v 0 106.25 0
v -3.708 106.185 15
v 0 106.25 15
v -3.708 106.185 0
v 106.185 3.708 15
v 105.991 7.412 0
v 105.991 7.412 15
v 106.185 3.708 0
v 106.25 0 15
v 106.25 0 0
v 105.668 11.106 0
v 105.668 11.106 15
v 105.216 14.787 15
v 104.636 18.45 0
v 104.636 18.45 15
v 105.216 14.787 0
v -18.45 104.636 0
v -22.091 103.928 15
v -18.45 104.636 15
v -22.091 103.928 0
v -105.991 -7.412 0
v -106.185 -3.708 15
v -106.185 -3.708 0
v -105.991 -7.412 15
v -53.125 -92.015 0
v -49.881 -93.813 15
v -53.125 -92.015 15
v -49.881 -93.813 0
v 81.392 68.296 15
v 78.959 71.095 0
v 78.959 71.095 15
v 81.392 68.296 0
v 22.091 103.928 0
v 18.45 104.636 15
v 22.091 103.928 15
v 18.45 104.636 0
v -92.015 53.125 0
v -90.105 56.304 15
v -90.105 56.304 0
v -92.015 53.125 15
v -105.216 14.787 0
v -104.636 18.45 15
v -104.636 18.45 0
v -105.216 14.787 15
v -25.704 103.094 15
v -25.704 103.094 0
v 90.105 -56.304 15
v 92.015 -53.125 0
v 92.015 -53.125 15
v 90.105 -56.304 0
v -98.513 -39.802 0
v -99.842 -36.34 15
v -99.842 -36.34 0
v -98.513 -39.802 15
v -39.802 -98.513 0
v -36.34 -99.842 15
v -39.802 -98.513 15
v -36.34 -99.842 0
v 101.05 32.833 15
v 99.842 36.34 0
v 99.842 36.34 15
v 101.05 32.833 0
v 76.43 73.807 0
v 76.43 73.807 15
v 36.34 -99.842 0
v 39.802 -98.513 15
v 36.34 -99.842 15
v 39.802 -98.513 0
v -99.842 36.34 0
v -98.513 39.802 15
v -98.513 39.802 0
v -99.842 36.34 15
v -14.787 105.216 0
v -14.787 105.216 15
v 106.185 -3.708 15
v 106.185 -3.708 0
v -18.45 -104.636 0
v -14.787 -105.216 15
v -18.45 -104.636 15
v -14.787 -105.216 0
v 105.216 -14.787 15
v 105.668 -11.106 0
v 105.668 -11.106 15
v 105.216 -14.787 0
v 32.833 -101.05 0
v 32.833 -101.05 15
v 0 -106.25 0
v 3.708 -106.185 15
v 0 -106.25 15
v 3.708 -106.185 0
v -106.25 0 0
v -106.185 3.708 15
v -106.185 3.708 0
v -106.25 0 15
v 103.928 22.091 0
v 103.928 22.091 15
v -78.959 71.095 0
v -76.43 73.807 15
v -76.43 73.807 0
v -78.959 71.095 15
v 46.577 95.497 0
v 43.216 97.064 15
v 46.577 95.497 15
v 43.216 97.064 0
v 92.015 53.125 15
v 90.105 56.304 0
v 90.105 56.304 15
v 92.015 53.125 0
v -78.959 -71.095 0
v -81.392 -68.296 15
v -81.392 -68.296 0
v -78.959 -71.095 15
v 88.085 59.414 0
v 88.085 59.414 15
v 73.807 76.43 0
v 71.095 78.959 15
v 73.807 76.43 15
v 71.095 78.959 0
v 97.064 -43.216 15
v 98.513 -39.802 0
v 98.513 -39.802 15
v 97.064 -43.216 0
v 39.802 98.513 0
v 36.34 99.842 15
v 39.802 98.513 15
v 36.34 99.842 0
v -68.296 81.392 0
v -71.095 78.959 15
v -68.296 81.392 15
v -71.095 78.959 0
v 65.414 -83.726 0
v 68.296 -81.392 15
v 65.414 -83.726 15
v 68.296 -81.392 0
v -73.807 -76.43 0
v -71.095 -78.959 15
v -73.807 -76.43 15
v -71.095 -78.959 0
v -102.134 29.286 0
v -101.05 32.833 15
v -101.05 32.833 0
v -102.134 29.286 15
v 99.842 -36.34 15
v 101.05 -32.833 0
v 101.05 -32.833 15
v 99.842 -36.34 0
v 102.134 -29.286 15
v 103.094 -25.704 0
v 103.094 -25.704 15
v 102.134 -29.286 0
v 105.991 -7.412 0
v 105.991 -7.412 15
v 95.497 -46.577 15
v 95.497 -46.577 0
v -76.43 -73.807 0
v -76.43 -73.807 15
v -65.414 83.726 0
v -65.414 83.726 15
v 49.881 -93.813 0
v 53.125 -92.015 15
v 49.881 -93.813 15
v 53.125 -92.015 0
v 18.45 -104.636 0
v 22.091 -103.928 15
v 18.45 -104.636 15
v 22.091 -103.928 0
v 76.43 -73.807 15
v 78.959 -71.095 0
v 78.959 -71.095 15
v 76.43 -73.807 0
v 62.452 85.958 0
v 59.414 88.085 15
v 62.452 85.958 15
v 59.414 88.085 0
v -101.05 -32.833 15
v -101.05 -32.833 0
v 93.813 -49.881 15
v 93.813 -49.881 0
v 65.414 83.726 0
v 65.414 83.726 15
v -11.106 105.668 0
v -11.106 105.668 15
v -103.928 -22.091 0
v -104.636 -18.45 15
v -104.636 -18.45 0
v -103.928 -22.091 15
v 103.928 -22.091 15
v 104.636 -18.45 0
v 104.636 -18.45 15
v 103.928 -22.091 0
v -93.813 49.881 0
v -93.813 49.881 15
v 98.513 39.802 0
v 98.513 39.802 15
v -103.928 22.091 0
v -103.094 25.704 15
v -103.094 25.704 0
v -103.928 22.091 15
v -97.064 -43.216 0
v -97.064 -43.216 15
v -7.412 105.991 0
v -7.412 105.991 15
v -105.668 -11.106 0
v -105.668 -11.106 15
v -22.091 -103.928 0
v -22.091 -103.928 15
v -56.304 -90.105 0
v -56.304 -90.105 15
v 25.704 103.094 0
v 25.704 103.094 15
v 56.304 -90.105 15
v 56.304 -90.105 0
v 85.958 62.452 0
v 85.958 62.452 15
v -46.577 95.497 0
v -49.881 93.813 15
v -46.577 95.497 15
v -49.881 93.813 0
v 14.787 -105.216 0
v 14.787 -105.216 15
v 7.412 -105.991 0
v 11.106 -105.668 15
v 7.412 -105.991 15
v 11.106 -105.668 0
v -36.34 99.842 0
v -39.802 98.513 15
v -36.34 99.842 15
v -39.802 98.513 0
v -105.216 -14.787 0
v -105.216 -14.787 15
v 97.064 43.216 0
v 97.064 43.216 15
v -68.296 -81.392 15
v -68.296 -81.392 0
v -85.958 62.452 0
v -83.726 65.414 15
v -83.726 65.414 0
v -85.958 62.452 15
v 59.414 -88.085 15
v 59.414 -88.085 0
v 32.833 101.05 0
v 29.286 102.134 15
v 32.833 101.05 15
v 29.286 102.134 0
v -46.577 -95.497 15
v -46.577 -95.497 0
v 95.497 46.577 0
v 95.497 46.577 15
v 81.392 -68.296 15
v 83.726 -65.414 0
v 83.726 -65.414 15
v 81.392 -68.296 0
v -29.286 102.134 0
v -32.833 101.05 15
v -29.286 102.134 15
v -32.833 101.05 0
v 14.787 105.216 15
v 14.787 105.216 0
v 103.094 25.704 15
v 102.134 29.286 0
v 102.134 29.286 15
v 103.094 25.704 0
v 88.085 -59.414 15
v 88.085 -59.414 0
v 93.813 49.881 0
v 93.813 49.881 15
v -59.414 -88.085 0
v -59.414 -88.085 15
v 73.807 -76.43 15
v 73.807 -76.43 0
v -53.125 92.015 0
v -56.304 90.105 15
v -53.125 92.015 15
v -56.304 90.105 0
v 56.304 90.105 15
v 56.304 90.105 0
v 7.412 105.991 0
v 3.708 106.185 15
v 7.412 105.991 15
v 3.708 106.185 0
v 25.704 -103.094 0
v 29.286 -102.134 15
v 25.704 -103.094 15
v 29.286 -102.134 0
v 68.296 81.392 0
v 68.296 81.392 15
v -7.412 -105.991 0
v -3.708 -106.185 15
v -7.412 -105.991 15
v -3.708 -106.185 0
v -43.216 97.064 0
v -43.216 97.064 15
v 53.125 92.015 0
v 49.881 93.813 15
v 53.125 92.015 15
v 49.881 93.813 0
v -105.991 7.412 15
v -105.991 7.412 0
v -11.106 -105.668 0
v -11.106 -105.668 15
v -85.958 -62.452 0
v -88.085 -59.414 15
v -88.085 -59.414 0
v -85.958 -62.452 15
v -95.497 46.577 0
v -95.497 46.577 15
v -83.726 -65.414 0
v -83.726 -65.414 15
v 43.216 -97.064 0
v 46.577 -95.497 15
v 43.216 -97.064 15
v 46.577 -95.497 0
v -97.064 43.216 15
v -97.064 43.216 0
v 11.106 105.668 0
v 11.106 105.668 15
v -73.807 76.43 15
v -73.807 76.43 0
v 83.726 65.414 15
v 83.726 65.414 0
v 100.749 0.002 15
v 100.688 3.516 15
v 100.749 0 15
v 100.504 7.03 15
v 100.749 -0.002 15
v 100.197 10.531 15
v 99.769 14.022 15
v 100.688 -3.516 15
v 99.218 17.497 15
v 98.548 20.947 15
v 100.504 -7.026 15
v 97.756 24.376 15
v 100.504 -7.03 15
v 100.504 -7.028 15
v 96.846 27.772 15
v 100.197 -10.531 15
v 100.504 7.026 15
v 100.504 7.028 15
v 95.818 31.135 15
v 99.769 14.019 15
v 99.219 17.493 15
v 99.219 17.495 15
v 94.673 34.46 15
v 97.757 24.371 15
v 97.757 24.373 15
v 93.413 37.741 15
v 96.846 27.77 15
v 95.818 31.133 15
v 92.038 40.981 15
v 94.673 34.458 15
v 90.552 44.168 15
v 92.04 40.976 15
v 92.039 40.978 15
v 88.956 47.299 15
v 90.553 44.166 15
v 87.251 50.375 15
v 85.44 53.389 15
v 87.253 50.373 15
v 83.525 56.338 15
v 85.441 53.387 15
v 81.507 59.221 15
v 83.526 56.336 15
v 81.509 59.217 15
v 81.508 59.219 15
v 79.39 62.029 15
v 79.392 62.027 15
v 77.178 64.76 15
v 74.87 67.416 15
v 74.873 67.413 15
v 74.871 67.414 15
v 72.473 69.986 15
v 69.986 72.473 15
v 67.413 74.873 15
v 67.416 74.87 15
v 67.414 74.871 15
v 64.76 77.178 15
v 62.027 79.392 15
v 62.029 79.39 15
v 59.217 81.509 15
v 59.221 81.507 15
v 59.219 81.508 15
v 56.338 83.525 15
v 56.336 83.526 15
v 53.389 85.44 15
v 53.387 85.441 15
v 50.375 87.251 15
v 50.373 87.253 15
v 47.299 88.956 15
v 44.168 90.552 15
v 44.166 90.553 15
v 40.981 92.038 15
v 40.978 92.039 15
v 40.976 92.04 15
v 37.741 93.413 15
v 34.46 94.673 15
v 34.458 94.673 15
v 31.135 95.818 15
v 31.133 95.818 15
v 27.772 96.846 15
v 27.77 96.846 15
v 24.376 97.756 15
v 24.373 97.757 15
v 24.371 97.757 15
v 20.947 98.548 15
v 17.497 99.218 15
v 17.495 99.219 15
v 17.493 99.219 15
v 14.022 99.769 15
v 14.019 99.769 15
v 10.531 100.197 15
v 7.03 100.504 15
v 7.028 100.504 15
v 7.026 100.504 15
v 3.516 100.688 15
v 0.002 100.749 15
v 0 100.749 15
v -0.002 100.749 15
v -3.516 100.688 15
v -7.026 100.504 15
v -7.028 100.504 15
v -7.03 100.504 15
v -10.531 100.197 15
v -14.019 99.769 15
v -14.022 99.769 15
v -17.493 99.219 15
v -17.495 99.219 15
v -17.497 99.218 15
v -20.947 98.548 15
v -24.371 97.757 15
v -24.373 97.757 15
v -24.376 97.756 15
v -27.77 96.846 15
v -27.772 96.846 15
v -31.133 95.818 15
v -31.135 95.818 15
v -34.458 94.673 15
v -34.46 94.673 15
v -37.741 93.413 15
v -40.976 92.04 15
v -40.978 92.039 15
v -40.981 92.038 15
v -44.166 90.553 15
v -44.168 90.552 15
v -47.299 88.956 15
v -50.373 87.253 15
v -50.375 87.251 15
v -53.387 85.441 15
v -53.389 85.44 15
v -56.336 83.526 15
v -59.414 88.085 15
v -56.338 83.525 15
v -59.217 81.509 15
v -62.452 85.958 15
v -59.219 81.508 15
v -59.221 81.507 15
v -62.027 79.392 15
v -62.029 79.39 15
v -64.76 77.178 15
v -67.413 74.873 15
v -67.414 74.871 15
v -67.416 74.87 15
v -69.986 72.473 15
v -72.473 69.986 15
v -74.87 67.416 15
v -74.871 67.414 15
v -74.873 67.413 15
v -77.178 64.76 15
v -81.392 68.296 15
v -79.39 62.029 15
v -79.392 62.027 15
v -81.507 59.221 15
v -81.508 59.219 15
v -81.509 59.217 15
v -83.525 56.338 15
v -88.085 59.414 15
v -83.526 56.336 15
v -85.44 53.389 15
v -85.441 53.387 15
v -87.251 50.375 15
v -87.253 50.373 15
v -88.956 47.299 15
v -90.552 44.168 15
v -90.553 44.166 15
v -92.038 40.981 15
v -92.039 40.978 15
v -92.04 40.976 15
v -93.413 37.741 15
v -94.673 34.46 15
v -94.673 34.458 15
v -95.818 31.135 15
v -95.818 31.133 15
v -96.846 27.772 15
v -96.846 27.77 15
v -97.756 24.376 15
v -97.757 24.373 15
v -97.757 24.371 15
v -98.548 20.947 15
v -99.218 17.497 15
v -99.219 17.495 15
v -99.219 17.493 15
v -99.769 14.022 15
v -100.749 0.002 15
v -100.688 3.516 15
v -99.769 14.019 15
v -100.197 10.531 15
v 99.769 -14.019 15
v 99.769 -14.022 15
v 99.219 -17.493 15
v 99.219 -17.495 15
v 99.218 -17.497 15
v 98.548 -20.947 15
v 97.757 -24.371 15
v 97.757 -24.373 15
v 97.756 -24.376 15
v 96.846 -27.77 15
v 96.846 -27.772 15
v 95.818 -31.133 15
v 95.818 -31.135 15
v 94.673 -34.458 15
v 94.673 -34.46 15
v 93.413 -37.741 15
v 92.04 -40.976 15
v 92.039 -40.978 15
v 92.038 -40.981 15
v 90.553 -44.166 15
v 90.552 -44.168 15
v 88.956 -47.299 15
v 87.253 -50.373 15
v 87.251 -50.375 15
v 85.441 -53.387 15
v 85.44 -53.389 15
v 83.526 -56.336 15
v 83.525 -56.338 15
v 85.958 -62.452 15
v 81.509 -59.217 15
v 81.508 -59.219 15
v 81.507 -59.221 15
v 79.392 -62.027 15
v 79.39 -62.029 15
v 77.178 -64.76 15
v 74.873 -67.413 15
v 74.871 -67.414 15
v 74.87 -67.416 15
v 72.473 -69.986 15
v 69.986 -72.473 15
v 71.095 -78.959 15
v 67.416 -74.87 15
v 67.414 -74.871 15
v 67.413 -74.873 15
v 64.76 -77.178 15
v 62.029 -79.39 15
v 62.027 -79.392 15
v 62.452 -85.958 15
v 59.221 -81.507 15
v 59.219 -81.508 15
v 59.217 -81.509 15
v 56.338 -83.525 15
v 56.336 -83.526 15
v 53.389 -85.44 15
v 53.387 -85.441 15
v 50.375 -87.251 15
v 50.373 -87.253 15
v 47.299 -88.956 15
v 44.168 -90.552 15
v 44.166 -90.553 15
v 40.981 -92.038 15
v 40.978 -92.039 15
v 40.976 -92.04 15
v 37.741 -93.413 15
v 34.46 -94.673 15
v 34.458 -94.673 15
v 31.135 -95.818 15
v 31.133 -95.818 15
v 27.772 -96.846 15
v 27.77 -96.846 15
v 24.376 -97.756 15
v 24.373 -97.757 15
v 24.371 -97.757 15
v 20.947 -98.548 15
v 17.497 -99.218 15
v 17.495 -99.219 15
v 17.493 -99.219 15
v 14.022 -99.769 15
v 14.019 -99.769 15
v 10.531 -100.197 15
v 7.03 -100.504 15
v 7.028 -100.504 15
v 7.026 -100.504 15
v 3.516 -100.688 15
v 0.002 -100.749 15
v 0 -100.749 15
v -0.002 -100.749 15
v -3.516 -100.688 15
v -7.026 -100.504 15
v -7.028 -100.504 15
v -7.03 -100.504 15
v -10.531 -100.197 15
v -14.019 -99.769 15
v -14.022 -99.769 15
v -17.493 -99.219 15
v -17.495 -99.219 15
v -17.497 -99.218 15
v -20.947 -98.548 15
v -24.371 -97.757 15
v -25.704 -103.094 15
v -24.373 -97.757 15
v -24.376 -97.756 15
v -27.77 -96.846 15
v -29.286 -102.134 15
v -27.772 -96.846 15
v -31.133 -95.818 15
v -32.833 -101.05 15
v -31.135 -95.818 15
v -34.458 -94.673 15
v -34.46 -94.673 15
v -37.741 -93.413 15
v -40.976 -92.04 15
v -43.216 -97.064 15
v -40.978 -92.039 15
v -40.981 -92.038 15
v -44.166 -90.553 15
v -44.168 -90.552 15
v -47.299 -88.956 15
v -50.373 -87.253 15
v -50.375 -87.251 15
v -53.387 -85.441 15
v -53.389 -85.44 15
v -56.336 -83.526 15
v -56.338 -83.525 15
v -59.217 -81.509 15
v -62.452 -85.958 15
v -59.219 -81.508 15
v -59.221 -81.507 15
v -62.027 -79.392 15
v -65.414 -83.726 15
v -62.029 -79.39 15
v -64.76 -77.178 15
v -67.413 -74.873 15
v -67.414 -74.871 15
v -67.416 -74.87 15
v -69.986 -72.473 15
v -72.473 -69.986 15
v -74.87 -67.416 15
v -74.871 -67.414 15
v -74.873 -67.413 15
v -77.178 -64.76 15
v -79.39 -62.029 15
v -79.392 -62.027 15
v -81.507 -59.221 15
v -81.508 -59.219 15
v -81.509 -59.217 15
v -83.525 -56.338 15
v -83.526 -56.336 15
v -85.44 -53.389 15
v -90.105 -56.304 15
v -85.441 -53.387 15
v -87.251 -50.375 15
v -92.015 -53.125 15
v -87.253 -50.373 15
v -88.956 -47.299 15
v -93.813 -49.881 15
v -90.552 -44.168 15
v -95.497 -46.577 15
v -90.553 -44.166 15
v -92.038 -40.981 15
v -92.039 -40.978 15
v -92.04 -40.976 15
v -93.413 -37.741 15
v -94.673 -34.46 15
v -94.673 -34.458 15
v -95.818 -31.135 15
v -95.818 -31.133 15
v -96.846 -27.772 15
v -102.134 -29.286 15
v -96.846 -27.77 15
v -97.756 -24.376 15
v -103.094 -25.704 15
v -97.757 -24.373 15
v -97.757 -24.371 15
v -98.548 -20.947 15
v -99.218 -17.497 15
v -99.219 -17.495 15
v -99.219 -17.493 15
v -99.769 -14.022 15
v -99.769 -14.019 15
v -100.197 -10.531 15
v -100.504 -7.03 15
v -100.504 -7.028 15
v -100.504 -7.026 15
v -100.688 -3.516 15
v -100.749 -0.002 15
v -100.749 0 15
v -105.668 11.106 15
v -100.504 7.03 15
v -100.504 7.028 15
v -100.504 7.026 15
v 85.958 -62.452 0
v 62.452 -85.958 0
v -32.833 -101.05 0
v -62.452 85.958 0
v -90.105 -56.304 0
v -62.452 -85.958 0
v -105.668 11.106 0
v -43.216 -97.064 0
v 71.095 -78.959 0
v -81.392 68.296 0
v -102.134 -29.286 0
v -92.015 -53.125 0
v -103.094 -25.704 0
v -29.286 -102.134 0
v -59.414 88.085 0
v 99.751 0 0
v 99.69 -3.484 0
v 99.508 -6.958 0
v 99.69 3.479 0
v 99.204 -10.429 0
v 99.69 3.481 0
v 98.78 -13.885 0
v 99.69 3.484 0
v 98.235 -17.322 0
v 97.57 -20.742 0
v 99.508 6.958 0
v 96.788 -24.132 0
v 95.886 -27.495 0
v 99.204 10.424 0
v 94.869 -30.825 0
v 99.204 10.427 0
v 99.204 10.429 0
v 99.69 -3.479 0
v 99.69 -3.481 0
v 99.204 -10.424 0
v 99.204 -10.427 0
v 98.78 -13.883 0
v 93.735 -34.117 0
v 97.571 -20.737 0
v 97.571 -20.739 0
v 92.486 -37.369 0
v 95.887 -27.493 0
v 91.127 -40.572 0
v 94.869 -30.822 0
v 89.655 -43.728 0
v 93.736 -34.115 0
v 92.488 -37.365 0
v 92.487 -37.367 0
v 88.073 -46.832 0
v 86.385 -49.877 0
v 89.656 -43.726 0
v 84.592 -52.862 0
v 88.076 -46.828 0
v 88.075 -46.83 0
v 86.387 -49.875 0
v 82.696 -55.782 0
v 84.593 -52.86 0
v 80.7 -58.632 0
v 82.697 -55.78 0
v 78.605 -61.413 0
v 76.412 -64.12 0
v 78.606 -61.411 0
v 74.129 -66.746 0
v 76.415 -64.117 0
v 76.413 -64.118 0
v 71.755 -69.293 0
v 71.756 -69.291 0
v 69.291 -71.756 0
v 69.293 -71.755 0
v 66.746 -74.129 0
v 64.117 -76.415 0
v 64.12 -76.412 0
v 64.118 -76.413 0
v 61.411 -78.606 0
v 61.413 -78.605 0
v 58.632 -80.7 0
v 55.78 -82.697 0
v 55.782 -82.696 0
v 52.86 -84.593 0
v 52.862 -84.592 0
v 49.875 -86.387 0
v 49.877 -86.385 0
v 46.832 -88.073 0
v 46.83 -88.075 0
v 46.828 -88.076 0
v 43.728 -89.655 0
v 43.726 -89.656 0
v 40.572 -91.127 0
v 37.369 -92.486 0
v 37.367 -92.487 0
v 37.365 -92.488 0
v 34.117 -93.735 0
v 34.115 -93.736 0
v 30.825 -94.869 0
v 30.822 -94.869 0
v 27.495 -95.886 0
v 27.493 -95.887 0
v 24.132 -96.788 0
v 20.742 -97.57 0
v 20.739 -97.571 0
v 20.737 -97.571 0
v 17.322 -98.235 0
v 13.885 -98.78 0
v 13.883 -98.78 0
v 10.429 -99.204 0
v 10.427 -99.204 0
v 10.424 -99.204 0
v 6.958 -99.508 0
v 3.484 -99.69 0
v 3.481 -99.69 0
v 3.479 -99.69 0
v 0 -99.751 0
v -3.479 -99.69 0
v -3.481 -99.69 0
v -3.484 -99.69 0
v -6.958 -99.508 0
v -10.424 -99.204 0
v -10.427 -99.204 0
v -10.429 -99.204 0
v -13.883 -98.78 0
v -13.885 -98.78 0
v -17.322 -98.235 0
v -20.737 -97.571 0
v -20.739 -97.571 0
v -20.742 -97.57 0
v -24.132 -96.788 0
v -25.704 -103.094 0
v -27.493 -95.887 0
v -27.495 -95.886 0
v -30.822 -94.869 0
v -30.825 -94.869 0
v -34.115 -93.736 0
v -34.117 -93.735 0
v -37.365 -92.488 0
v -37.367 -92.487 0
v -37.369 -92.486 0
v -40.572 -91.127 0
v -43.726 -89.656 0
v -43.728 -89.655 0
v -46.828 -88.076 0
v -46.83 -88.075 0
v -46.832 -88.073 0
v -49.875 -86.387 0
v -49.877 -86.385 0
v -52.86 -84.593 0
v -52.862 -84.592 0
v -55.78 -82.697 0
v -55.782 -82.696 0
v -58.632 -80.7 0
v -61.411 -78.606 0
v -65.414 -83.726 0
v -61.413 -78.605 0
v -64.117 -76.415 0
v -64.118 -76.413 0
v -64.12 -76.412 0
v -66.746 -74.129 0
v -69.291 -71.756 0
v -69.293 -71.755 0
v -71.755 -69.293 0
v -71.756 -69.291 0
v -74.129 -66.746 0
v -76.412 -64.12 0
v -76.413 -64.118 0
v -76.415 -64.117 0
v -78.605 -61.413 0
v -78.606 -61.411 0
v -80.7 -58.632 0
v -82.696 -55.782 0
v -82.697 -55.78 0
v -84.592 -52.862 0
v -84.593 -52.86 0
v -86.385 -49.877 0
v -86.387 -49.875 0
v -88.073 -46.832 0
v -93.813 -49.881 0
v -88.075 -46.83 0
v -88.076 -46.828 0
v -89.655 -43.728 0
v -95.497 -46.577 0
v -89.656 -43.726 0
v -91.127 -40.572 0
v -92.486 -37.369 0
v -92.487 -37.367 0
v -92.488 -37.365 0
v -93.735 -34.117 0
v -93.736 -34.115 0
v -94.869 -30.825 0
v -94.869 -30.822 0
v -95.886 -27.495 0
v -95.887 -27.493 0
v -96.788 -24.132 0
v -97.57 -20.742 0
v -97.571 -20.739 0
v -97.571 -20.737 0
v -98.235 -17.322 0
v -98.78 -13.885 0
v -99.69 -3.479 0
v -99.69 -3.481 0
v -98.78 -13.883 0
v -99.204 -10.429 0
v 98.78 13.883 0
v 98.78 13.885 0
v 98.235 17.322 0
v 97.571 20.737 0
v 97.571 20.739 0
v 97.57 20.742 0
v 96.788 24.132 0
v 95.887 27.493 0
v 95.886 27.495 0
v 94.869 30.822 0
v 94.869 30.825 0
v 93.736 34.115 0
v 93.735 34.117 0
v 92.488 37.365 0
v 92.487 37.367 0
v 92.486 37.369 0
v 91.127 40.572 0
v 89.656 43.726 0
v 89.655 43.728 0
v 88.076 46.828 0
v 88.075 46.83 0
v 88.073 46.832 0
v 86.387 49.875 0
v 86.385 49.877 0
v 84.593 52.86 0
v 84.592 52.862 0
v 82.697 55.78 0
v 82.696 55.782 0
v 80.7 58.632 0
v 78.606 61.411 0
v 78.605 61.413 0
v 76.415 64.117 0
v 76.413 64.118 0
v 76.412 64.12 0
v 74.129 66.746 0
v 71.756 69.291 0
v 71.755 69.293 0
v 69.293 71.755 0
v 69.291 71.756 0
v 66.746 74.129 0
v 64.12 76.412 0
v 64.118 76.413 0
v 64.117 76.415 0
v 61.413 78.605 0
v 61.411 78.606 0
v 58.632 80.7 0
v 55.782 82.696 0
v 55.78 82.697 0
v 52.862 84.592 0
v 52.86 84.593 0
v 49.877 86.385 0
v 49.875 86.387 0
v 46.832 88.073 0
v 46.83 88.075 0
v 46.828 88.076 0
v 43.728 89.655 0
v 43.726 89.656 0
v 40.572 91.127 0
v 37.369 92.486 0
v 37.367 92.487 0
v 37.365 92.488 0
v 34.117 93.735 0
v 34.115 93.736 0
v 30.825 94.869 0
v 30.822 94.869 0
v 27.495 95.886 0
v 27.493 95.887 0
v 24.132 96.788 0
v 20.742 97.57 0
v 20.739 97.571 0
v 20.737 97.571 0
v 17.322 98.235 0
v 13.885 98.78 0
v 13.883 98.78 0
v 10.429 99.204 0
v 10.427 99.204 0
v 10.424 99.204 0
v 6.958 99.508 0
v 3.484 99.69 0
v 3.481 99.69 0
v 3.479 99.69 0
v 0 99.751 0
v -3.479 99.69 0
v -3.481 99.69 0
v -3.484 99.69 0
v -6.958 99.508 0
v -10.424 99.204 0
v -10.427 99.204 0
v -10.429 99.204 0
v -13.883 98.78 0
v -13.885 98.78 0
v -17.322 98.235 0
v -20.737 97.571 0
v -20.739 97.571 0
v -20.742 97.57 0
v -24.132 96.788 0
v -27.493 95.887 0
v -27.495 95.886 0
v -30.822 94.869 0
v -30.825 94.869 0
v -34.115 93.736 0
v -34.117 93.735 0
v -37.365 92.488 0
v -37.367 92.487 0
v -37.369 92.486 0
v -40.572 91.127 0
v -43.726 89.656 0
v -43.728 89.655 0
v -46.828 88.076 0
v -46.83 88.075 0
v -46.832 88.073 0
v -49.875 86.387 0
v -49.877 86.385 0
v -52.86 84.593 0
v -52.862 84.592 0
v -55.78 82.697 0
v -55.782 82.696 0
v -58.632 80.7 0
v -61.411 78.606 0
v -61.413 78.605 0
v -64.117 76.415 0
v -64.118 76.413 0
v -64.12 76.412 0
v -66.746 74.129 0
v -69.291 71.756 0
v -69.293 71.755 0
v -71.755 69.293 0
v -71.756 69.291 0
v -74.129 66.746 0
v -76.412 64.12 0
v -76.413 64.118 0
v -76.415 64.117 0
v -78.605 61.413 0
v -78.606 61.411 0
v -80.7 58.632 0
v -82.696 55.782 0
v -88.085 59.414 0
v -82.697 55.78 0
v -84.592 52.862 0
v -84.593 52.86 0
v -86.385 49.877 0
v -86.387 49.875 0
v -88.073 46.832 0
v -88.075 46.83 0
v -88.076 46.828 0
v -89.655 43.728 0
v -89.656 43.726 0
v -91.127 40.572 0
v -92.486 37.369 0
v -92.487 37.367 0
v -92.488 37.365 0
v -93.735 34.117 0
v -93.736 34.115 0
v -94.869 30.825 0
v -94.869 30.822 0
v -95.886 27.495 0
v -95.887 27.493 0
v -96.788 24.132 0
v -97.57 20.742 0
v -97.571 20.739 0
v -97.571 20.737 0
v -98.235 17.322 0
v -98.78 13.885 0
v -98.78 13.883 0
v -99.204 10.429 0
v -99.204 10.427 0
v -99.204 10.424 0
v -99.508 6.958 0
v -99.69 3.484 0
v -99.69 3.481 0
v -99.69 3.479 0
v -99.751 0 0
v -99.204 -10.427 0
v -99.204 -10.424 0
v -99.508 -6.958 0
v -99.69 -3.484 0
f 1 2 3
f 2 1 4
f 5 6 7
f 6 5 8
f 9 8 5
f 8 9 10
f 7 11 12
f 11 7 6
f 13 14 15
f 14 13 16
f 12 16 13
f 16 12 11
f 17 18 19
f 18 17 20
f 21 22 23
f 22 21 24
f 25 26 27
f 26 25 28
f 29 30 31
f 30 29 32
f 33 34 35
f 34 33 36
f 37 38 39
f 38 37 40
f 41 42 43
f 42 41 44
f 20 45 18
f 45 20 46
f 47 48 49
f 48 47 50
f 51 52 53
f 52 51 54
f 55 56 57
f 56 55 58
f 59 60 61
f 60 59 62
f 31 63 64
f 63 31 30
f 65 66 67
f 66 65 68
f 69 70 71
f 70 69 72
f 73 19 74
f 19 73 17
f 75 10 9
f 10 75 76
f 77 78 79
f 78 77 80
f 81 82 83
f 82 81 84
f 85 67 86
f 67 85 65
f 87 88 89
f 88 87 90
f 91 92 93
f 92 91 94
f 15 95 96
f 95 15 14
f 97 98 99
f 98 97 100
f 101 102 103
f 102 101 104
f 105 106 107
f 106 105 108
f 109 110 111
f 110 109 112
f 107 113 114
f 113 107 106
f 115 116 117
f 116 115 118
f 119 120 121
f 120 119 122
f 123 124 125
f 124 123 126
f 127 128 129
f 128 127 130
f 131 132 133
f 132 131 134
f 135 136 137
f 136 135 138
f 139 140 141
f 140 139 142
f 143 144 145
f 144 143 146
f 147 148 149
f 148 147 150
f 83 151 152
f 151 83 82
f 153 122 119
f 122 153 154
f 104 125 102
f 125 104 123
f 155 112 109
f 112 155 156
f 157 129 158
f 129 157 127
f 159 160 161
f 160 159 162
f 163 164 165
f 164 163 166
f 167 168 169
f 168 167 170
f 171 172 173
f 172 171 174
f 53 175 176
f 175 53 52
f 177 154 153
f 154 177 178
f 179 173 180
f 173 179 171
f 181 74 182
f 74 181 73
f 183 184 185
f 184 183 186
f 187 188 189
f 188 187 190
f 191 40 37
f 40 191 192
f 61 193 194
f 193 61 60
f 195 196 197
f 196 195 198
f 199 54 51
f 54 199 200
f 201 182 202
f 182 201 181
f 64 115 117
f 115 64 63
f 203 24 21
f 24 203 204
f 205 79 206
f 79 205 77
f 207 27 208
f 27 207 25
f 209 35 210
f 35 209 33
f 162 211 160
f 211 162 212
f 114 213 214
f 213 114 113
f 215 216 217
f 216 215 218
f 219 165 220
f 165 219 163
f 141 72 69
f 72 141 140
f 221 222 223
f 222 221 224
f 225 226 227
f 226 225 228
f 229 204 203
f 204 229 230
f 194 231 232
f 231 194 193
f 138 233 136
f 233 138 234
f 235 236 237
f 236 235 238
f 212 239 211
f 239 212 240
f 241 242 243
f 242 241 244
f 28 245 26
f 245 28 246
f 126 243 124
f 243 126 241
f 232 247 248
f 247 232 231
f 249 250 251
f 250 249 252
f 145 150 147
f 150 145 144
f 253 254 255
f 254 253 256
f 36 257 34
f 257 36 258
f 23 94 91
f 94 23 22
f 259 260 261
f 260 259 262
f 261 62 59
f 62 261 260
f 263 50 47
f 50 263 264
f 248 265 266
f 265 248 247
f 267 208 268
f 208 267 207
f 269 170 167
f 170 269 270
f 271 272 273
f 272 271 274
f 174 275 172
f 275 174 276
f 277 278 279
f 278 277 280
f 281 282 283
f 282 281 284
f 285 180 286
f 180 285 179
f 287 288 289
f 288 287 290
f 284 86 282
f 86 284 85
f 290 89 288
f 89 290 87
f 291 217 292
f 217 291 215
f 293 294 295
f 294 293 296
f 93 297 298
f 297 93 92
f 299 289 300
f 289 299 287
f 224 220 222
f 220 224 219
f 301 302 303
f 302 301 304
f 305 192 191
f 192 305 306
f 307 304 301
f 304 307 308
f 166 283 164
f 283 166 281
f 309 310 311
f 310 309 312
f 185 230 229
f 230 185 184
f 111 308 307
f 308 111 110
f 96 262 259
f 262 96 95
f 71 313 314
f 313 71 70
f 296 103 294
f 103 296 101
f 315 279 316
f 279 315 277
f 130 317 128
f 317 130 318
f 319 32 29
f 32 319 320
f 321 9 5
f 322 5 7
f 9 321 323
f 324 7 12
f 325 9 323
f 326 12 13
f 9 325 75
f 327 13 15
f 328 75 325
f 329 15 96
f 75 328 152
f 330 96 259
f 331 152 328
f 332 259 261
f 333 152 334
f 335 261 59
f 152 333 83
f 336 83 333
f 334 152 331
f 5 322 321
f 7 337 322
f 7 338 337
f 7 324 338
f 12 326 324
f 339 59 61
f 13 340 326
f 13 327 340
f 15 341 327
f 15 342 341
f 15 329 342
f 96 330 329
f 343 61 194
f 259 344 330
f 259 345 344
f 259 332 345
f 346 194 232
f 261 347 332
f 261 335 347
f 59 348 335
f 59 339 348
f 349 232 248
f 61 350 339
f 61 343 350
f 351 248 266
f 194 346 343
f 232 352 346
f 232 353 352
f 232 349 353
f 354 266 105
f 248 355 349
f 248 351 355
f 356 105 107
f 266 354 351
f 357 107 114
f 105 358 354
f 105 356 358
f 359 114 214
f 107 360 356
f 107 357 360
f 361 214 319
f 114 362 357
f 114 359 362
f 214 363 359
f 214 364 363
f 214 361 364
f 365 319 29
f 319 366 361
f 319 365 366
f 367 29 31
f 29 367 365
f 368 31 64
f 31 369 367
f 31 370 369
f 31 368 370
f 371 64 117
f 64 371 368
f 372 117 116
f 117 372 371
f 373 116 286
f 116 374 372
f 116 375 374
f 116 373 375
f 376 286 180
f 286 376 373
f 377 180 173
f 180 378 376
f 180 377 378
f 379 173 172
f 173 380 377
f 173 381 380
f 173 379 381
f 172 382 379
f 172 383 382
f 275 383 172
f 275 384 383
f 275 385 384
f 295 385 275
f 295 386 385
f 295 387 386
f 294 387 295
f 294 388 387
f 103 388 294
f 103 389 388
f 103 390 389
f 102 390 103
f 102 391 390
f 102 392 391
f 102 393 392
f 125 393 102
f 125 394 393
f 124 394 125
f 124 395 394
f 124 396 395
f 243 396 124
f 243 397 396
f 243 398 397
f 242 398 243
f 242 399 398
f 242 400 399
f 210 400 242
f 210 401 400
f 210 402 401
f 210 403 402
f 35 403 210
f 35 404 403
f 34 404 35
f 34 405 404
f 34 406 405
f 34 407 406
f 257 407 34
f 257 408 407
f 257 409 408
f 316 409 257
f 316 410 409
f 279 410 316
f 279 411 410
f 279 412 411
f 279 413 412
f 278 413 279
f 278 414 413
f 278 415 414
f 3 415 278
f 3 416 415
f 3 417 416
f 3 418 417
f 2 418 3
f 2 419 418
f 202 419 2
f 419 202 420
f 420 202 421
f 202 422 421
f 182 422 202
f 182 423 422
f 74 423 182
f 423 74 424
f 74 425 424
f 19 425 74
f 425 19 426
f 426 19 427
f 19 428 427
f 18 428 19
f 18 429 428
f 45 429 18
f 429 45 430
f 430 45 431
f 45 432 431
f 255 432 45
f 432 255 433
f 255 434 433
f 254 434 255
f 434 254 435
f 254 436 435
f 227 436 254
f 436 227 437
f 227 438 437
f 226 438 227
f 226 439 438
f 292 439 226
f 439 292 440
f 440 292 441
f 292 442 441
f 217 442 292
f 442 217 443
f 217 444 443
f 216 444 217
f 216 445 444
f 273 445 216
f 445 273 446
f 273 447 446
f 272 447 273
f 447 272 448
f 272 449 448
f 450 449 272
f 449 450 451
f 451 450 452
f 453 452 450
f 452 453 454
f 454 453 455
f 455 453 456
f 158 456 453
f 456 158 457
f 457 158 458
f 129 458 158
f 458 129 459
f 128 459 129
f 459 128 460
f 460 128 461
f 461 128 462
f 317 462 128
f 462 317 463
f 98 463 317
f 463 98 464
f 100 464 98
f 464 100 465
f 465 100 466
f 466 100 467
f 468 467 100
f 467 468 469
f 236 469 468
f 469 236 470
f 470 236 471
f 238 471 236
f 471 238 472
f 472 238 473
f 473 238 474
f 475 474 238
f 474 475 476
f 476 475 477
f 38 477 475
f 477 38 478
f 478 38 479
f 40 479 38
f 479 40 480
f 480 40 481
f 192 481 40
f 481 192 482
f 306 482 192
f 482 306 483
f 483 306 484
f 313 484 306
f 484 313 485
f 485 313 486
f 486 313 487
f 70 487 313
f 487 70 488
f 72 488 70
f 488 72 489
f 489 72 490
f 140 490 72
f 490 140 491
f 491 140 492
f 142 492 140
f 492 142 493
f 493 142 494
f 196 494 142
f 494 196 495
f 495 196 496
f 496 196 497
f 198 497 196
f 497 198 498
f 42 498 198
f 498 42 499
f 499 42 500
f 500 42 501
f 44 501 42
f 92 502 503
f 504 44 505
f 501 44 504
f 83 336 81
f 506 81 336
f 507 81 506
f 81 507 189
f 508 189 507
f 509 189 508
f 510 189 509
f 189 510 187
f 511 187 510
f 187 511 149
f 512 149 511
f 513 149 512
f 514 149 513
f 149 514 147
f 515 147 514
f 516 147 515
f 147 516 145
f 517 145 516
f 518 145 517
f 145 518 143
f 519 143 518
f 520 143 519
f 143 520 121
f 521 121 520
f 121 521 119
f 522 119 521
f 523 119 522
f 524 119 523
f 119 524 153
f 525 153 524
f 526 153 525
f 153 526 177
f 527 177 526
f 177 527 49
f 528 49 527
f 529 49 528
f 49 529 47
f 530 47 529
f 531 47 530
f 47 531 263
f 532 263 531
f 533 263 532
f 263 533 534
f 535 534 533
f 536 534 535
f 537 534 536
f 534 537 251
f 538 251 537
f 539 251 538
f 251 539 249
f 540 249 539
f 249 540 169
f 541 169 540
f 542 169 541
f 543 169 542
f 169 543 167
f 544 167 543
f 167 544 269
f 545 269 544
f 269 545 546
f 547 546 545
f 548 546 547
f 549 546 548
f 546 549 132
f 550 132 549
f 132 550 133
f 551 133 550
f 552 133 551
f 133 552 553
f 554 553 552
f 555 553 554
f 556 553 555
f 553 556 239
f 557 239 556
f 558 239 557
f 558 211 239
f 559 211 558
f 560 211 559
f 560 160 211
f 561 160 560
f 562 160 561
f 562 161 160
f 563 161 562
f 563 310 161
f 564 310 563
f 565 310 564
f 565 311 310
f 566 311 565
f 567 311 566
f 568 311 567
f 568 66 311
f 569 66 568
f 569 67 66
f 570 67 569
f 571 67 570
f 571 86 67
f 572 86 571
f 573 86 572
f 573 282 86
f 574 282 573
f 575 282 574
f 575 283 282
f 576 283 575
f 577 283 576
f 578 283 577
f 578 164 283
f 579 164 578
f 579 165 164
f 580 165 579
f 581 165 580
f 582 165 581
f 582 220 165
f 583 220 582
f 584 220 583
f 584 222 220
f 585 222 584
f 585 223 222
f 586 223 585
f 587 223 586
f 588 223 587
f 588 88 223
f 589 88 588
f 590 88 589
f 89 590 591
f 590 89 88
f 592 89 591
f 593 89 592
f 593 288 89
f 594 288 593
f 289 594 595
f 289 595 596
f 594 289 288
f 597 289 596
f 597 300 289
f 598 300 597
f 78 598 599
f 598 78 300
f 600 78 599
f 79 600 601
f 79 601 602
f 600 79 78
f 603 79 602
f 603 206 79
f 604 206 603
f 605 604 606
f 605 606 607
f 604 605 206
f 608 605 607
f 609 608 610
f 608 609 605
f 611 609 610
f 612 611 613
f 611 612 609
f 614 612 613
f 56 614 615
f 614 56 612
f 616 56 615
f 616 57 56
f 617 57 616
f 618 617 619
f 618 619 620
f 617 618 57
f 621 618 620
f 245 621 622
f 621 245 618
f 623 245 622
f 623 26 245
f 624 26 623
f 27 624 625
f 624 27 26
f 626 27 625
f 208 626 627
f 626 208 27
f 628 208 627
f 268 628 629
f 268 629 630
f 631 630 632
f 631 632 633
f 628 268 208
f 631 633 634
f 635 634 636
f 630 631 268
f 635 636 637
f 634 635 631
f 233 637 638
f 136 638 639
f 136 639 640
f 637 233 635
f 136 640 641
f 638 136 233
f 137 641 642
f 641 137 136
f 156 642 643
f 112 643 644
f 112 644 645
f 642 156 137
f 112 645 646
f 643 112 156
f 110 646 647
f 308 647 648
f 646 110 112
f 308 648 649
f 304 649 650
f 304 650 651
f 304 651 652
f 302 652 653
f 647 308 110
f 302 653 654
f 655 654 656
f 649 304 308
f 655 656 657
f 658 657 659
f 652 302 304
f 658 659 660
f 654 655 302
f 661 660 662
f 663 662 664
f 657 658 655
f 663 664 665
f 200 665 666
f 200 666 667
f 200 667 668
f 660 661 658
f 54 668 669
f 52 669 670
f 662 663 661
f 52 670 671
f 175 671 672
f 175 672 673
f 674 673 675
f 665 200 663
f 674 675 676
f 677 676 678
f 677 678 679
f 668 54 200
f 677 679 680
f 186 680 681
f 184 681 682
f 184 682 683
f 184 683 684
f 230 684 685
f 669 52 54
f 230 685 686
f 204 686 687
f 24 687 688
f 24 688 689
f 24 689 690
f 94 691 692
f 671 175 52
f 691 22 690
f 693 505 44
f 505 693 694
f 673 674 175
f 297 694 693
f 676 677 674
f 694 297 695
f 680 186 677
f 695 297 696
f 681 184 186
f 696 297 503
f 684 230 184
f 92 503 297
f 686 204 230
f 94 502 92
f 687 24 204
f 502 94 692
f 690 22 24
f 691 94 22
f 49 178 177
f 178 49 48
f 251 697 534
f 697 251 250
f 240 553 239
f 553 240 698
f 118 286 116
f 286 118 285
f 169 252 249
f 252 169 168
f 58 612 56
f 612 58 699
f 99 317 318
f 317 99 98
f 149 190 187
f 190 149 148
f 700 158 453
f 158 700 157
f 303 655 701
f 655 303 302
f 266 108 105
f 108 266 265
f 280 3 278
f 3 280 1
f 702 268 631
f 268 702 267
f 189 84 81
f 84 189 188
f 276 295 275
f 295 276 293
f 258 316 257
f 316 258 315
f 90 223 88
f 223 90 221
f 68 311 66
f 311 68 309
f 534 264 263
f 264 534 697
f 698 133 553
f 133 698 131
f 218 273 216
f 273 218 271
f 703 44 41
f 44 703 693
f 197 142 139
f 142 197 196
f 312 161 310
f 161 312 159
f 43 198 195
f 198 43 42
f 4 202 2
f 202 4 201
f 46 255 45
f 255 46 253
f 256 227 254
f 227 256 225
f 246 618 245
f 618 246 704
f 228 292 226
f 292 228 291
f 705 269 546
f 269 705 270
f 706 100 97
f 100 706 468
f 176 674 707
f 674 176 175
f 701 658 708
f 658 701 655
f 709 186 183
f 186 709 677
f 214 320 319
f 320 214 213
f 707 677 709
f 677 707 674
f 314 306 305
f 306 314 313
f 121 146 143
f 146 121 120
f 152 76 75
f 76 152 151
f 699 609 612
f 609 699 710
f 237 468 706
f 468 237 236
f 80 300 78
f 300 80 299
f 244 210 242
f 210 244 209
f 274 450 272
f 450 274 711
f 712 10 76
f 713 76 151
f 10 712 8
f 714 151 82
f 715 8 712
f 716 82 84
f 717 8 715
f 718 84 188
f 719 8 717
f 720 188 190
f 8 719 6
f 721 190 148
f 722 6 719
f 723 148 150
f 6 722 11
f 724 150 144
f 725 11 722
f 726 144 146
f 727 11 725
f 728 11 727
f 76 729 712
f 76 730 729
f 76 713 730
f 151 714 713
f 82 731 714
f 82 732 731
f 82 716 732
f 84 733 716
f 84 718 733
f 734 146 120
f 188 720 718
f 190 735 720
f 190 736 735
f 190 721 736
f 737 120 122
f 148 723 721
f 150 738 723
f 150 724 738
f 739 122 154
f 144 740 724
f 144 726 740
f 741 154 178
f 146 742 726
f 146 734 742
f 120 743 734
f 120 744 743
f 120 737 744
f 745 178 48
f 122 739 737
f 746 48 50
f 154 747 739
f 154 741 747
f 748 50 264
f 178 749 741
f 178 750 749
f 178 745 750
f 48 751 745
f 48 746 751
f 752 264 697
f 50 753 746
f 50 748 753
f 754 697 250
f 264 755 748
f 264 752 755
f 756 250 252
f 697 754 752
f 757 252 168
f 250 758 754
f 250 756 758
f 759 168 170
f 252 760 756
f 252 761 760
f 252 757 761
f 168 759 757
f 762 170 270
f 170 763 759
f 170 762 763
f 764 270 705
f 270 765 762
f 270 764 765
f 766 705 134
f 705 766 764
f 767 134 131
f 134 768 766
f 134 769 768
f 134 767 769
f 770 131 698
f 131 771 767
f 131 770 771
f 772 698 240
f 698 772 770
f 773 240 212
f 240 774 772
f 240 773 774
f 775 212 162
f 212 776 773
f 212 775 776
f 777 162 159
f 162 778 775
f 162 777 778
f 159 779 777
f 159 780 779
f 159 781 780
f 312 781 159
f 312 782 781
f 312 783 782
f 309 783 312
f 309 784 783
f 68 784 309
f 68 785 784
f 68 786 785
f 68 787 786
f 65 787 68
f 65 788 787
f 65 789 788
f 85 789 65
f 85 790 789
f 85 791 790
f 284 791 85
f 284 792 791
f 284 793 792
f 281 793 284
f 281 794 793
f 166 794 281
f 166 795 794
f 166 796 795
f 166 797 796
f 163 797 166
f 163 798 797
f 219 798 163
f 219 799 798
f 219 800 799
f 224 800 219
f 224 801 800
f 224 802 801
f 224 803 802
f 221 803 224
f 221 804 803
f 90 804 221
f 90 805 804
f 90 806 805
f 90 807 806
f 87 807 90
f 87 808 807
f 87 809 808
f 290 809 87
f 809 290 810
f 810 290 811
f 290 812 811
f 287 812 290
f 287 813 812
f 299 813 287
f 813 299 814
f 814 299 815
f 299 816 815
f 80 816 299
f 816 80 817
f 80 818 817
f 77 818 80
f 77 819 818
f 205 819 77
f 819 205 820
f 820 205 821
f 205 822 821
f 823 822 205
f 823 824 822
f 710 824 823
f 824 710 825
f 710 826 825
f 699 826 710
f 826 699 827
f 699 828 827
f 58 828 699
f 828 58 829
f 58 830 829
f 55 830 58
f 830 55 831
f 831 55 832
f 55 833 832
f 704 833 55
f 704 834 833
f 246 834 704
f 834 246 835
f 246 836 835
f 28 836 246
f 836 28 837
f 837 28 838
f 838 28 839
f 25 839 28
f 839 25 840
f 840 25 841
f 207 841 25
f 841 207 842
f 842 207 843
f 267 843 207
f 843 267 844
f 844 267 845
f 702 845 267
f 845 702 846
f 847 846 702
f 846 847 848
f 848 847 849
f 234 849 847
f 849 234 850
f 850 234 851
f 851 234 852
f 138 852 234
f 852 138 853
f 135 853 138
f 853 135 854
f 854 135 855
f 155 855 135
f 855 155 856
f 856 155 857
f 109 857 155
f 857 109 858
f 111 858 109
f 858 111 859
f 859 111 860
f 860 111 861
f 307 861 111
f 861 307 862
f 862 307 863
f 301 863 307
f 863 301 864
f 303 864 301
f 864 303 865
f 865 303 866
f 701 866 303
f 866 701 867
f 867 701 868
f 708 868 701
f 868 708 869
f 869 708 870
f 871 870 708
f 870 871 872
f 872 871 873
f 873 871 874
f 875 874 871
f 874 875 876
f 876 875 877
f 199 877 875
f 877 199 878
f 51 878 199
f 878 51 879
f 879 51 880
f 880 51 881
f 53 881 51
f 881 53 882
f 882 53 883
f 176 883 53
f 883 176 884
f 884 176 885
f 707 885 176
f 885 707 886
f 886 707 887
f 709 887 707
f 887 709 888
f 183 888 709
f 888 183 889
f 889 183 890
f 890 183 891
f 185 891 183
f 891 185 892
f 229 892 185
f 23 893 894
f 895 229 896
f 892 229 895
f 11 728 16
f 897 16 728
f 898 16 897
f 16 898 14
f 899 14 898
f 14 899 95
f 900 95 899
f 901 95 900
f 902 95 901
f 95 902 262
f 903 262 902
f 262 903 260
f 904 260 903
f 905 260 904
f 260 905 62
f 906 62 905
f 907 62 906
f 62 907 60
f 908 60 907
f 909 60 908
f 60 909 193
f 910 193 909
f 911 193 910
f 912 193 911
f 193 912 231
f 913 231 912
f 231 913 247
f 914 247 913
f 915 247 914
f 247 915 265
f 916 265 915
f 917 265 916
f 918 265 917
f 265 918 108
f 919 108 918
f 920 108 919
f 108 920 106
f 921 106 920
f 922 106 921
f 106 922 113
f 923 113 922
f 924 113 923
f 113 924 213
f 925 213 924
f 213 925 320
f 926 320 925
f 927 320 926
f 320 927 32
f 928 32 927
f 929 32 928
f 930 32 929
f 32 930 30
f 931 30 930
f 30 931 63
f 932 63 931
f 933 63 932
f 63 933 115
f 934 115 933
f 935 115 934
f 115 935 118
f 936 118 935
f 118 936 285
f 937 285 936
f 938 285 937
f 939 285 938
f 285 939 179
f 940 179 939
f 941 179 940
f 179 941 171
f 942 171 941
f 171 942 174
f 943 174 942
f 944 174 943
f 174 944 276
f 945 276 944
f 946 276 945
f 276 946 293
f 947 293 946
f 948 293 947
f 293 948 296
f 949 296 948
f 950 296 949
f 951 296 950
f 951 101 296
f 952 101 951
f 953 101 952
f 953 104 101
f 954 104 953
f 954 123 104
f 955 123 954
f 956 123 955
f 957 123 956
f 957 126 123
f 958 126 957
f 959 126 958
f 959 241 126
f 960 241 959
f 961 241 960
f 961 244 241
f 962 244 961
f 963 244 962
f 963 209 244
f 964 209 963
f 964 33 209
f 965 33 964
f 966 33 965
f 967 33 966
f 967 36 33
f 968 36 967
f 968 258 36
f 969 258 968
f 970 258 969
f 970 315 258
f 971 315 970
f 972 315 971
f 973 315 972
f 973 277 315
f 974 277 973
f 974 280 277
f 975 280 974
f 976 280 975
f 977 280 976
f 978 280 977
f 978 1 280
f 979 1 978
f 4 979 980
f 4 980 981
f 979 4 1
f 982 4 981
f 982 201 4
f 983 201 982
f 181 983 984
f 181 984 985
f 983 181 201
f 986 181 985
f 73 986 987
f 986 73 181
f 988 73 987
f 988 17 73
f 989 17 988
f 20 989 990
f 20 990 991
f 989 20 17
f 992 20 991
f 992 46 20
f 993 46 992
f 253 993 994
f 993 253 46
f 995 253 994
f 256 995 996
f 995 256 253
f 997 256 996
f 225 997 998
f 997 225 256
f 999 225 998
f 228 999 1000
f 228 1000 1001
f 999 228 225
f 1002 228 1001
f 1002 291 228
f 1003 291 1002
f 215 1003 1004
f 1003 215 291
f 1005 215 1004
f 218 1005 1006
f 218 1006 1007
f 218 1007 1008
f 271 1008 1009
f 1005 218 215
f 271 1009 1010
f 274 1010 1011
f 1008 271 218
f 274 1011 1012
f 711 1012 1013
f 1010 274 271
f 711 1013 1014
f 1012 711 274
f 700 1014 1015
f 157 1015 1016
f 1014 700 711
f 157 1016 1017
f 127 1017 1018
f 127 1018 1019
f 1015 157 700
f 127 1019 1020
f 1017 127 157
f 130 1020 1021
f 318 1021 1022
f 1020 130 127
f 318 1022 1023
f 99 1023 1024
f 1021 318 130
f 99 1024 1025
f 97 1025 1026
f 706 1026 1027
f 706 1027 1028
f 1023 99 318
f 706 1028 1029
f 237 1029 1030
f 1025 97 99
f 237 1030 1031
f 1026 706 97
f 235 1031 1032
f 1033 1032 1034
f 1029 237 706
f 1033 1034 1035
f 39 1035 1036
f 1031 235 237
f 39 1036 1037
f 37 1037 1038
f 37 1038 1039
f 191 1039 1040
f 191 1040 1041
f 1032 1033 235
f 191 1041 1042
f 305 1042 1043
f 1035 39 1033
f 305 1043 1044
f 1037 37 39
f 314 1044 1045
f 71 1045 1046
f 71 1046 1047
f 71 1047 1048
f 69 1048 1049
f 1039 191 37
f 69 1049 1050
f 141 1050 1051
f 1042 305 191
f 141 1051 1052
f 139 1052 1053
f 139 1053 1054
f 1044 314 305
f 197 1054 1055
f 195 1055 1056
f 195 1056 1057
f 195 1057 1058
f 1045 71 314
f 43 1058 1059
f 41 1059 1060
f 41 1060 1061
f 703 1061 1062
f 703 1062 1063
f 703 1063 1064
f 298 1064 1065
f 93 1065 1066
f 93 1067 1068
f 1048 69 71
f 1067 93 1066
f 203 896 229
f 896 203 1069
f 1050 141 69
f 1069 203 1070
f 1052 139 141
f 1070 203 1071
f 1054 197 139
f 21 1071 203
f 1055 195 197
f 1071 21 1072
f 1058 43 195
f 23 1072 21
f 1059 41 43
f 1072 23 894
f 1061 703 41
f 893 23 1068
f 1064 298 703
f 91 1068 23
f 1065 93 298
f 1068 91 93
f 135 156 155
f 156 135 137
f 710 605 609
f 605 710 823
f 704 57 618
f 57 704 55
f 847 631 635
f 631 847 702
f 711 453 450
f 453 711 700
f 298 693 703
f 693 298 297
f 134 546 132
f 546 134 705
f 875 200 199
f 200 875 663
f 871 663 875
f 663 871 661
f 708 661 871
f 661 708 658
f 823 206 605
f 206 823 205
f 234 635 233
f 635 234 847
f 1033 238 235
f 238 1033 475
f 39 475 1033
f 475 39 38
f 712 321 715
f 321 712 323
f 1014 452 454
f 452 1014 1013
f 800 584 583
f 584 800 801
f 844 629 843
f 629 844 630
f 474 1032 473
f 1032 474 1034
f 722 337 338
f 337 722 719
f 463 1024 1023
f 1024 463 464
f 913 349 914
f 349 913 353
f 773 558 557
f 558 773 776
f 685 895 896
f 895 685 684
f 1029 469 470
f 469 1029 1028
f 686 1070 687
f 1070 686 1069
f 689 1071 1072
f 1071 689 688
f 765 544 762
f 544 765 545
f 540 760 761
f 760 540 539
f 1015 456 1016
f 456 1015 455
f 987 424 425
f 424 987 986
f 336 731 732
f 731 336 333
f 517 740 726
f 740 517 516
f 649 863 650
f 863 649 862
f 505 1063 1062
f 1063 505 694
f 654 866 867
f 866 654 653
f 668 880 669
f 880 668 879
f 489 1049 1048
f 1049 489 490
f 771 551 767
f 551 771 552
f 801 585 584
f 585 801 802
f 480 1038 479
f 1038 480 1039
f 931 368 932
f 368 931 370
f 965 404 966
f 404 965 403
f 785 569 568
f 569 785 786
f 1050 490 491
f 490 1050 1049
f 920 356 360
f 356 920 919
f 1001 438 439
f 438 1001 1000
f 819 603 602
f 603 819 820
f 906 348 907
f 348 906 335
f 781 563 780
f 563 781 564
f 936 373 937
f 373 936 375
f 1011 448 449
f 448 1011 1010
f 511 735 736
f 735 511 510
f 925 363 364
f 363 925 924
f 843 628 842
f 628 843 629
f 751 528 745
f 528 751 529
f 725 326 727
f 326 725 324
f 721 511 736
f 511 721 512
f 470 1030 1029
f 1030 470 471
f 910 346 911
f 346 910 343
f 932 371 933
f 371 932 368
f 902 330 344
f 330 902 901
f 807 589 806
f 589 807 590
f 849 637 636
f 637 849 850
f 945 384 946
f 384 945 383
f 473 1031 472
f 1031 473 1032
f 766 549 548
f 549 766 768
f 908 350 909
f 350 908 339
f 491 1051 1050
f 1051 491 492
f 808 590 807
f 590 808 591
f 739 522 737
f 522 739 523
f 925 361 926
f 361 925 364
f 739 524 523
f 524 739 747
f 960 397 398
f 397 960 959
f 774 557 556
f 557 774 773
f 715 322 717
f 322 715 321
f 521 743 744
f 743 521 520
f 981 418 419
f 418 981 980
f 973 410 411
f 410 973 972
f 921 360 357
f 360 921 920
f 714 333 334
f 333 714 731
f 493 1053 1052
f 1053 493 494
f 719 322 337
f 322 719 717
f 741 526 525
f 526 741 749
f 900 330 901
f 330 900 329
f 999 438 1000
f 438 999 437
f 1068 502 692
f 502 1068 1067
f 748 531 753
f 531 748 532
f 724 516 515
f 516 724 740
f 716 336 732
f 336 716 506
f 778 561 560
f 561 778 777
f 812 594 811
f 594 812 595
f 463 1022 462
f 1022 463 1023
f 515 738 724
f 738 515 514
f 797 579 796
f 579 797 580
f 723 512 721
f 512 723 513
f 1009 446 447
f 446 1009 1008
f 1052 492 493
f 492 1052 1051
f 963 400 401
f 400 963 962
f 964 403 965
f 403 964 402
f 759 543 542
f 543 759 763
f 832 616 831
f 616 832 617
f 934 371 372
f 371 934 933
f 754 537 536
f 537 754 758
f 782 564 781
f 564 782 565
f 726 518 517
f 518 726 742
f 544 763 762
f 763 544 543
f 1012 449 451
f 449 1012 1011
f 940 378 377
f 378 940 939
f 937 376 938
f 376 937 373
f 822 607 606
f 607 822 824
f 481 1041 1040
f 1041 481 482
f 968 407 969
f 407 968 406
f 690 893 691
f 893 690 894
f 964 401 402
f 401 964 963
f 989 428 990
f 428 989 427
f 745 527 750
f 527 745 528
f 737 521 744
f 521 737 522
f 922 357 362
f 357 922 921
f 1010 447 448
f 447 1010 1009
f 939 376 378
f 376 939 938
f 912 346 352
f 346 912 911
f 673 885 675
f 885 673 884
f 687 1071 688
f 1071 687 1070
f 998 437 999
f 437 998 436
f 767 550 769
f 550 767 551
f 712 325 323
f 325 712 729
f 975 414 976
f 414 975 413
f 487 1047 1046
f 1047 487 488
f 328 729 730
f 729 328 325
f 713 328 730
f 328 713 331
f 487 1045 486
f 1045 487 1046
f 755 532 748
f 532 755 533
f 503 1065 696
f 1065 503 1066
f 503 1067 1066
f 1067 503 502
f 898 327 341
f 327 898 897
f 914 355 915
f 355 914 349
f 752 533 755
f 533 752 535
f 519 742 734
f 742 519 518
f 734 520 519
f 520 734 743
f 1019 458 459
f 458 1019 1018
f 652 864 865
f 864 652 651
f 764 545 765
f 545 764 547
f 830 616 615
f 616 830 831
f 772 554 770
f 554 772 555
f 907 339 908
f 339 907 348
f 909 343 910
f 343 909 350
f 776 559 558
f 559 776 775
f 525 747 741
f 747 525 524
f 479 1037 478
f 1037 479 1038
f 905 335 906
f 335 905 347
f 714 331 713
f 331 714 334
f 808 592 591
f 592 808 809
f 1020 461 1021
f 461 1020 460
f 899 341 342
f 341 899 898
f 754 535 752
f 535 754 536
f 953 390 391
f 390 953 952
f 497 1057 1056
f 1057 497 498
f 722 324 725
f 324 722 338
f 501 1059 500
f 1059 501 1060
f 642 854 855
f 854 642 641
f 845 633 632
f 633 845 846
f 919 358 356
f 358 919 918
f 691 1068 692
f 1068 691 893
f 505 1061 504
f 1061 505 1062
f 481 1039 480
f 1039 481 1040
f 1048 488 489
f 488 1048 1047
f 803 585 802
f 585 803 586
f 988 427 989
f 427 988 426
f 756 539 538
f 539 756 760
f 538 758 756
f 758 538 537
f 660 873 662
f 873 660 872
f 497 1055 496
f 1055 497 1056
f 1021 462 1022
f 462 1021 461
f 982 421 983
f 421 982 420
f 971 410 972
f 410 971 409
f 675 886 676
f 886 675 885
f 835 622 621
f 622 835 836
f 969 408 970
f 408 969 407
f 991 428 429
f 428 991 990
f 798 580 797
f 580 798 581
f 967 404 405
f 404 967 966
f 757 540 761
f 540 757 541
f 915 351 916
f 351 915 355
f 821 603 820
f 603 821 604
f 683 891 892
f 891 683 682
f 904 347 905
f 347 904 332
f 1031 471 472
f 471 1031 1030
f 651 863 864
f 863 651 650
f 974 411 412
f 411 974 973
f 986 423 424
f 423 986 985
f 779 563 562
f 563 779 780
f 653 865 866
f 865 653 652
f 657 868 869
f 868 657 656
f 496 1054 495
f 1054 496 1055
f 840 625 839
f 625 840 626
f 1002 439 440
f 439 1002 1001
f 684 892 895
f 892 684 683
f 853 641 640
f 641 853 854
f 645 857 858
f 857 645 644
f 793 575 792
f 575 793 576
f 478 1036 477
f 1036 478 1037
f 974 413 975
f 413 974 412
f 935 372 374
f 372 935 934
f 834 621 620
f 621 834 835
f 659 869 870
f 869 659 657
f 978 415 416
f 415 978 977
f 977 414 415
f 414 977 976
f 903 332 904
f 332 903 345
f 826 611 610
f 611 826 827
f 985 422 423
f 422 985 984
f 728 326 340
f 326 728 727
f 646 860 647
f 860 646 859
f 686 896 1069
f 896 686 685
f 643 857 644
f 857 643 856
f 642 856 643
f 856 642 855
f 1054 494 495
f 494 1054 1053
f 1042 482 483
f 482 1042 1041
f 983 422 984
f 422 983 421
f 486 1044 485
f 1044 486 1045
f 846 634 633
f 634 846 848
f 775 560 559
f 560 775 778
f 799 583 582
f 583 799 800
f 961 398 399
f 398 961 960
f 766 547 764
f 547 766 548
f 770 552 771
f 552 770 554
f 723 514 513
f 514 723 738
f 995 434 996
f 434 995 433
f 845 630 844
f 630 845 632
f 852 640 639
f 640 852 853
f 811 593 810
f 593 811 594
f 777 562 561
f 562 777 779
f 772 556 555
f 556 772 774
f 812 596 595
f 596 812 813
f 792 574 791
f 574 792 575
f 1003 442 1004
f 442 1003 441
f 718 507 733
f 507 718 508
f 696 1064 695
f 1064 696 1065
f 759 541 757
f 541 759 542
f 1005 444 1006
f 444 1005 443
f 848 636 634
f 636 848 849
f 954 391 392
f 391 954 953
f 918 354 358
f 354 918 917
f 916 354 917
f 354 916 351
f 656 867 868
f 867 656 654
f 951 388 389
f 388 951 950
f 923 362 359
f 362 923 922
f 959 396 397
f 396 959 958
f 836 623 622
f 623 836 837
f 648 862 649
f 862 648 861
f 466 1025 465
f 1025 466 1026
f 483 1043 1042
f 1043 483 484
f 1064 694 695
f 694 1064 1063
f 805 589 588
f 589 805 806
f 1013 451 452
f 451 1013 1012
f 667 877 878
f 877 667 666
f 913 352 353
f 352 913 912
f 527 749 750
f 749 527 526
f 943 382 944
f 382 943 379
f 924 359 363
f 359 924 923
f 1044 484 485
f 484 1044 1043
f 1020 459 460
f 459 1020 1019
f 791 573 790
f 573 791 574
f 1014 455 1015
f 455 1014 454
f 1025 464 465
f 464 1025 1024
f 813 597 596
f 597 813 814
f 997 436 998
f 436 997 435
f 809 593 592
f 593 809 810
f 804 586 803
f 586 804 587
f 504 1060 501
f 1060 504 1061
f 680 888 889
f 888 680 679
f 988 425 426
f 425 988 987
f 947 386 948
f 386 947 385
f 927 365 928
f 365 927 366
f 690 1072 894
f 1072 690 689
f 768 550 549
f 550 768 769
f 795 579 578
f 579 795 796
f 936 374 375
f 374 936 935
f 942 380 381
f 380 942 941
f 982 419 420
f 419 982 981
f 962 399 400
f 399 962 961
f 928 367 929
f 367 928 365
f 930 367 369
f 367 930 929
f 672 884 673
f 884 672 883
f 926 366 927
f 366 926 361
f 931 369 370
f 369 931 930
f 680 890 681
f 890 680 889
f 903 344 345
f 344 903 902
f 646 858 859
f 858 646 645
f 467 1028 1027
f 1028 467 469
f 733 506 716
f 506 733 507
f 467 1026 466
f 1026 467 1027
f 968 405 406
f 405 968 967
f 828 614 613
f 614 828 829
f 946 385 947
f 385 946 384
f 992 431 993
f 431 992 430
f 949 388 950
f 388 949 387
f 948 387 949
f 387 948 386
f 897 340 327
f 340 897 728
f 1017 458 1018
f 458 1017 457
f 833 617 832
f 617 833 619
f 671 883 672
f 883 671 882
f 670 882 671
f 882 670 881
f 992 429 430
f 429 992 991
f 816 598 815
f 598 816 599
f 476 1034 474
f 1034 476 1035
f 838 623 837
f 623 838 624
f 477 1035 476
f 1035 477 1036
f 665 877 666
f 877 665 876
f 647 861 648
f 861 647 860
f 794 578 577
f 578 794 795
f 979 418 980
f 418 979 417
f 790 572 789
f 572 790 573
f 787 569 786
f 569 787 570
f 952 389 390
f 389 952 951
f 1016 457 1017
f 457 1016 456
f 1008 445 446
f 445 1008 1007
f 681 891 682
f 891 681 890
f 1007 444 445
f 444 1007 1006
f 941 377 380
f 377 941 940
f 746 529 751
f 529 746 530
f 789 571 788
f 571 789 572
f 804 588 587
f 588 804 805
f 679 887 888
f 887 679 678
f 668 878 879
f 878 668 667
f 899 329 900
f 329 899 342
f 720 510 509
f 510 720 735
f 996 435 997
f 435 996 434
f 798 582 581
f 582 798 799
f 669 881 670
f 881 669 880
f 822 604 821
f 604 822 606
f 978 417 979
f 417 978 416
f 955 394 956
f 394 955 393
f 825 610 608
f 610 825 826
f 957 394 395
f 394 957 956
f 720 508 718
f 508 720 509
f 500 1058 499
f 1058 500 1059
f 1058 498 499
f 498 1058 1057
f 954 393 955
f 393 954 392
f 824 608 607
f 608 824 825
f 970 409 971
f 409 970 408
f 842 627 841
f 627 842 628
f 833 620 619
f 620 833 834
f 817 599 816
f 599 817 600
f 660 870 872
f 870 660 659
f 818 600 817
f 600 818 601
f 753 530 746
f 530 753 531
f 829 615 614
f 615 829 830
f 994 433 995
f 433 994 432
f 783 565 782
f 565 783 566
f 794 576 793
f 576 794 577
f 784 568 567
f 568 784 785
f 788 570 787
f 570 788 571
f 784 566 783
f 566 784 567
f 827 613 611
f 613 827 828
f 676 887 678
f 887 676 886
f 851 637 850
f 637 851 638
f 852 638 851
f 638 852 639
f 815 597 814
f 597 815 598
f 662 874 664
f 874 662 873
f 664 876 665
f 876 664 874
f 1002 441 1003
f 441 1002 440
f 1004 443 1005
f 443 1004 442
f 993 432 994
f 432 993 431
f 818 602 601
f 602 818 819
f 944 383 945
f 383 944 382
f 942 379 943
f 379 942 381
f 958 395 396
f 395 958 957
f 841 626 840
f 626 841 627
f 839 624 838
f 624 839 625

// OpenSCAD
// Copyright 2025 Heikki Suonsivu
// Licensed under Creative Commons CC-BY-NC-SA, see https://creativecommons.org/licenses/by-nc-sa/4.0/
// For commercial licensing, please contact directly, hsu-3d@suonsivu.net, +358 40 551 9679

include <hsu.scad>

kaivo0d=216;
kaivo9d=212.5;
kaivo24d=195;
kaivoh=17;

kansid=216-2*1.1; // 216??;
kansi9d=202-0.5;//196;
kansi24d=200-0.5;//194;

cornerd=2;

difference() {
  union() {
    //translate([0,0,24-9]) cylinder(d1=kaivo9d,d2=kaivo0d,h=9,$fn=180);
    translate([0,0,0]) cylinder(d=kaivo9d,h=24-9,$fn=180);
  }
  //  translate([0,0,24-9]) cylinder(d1=kansid-4,d2=kansid,h=9+0.01,$fn=180);
  translate([0,0,-0.01]) cylinder(d1=kansi24d,d2=kansi9d,h=24-9+0.02,$fn=180);
}
